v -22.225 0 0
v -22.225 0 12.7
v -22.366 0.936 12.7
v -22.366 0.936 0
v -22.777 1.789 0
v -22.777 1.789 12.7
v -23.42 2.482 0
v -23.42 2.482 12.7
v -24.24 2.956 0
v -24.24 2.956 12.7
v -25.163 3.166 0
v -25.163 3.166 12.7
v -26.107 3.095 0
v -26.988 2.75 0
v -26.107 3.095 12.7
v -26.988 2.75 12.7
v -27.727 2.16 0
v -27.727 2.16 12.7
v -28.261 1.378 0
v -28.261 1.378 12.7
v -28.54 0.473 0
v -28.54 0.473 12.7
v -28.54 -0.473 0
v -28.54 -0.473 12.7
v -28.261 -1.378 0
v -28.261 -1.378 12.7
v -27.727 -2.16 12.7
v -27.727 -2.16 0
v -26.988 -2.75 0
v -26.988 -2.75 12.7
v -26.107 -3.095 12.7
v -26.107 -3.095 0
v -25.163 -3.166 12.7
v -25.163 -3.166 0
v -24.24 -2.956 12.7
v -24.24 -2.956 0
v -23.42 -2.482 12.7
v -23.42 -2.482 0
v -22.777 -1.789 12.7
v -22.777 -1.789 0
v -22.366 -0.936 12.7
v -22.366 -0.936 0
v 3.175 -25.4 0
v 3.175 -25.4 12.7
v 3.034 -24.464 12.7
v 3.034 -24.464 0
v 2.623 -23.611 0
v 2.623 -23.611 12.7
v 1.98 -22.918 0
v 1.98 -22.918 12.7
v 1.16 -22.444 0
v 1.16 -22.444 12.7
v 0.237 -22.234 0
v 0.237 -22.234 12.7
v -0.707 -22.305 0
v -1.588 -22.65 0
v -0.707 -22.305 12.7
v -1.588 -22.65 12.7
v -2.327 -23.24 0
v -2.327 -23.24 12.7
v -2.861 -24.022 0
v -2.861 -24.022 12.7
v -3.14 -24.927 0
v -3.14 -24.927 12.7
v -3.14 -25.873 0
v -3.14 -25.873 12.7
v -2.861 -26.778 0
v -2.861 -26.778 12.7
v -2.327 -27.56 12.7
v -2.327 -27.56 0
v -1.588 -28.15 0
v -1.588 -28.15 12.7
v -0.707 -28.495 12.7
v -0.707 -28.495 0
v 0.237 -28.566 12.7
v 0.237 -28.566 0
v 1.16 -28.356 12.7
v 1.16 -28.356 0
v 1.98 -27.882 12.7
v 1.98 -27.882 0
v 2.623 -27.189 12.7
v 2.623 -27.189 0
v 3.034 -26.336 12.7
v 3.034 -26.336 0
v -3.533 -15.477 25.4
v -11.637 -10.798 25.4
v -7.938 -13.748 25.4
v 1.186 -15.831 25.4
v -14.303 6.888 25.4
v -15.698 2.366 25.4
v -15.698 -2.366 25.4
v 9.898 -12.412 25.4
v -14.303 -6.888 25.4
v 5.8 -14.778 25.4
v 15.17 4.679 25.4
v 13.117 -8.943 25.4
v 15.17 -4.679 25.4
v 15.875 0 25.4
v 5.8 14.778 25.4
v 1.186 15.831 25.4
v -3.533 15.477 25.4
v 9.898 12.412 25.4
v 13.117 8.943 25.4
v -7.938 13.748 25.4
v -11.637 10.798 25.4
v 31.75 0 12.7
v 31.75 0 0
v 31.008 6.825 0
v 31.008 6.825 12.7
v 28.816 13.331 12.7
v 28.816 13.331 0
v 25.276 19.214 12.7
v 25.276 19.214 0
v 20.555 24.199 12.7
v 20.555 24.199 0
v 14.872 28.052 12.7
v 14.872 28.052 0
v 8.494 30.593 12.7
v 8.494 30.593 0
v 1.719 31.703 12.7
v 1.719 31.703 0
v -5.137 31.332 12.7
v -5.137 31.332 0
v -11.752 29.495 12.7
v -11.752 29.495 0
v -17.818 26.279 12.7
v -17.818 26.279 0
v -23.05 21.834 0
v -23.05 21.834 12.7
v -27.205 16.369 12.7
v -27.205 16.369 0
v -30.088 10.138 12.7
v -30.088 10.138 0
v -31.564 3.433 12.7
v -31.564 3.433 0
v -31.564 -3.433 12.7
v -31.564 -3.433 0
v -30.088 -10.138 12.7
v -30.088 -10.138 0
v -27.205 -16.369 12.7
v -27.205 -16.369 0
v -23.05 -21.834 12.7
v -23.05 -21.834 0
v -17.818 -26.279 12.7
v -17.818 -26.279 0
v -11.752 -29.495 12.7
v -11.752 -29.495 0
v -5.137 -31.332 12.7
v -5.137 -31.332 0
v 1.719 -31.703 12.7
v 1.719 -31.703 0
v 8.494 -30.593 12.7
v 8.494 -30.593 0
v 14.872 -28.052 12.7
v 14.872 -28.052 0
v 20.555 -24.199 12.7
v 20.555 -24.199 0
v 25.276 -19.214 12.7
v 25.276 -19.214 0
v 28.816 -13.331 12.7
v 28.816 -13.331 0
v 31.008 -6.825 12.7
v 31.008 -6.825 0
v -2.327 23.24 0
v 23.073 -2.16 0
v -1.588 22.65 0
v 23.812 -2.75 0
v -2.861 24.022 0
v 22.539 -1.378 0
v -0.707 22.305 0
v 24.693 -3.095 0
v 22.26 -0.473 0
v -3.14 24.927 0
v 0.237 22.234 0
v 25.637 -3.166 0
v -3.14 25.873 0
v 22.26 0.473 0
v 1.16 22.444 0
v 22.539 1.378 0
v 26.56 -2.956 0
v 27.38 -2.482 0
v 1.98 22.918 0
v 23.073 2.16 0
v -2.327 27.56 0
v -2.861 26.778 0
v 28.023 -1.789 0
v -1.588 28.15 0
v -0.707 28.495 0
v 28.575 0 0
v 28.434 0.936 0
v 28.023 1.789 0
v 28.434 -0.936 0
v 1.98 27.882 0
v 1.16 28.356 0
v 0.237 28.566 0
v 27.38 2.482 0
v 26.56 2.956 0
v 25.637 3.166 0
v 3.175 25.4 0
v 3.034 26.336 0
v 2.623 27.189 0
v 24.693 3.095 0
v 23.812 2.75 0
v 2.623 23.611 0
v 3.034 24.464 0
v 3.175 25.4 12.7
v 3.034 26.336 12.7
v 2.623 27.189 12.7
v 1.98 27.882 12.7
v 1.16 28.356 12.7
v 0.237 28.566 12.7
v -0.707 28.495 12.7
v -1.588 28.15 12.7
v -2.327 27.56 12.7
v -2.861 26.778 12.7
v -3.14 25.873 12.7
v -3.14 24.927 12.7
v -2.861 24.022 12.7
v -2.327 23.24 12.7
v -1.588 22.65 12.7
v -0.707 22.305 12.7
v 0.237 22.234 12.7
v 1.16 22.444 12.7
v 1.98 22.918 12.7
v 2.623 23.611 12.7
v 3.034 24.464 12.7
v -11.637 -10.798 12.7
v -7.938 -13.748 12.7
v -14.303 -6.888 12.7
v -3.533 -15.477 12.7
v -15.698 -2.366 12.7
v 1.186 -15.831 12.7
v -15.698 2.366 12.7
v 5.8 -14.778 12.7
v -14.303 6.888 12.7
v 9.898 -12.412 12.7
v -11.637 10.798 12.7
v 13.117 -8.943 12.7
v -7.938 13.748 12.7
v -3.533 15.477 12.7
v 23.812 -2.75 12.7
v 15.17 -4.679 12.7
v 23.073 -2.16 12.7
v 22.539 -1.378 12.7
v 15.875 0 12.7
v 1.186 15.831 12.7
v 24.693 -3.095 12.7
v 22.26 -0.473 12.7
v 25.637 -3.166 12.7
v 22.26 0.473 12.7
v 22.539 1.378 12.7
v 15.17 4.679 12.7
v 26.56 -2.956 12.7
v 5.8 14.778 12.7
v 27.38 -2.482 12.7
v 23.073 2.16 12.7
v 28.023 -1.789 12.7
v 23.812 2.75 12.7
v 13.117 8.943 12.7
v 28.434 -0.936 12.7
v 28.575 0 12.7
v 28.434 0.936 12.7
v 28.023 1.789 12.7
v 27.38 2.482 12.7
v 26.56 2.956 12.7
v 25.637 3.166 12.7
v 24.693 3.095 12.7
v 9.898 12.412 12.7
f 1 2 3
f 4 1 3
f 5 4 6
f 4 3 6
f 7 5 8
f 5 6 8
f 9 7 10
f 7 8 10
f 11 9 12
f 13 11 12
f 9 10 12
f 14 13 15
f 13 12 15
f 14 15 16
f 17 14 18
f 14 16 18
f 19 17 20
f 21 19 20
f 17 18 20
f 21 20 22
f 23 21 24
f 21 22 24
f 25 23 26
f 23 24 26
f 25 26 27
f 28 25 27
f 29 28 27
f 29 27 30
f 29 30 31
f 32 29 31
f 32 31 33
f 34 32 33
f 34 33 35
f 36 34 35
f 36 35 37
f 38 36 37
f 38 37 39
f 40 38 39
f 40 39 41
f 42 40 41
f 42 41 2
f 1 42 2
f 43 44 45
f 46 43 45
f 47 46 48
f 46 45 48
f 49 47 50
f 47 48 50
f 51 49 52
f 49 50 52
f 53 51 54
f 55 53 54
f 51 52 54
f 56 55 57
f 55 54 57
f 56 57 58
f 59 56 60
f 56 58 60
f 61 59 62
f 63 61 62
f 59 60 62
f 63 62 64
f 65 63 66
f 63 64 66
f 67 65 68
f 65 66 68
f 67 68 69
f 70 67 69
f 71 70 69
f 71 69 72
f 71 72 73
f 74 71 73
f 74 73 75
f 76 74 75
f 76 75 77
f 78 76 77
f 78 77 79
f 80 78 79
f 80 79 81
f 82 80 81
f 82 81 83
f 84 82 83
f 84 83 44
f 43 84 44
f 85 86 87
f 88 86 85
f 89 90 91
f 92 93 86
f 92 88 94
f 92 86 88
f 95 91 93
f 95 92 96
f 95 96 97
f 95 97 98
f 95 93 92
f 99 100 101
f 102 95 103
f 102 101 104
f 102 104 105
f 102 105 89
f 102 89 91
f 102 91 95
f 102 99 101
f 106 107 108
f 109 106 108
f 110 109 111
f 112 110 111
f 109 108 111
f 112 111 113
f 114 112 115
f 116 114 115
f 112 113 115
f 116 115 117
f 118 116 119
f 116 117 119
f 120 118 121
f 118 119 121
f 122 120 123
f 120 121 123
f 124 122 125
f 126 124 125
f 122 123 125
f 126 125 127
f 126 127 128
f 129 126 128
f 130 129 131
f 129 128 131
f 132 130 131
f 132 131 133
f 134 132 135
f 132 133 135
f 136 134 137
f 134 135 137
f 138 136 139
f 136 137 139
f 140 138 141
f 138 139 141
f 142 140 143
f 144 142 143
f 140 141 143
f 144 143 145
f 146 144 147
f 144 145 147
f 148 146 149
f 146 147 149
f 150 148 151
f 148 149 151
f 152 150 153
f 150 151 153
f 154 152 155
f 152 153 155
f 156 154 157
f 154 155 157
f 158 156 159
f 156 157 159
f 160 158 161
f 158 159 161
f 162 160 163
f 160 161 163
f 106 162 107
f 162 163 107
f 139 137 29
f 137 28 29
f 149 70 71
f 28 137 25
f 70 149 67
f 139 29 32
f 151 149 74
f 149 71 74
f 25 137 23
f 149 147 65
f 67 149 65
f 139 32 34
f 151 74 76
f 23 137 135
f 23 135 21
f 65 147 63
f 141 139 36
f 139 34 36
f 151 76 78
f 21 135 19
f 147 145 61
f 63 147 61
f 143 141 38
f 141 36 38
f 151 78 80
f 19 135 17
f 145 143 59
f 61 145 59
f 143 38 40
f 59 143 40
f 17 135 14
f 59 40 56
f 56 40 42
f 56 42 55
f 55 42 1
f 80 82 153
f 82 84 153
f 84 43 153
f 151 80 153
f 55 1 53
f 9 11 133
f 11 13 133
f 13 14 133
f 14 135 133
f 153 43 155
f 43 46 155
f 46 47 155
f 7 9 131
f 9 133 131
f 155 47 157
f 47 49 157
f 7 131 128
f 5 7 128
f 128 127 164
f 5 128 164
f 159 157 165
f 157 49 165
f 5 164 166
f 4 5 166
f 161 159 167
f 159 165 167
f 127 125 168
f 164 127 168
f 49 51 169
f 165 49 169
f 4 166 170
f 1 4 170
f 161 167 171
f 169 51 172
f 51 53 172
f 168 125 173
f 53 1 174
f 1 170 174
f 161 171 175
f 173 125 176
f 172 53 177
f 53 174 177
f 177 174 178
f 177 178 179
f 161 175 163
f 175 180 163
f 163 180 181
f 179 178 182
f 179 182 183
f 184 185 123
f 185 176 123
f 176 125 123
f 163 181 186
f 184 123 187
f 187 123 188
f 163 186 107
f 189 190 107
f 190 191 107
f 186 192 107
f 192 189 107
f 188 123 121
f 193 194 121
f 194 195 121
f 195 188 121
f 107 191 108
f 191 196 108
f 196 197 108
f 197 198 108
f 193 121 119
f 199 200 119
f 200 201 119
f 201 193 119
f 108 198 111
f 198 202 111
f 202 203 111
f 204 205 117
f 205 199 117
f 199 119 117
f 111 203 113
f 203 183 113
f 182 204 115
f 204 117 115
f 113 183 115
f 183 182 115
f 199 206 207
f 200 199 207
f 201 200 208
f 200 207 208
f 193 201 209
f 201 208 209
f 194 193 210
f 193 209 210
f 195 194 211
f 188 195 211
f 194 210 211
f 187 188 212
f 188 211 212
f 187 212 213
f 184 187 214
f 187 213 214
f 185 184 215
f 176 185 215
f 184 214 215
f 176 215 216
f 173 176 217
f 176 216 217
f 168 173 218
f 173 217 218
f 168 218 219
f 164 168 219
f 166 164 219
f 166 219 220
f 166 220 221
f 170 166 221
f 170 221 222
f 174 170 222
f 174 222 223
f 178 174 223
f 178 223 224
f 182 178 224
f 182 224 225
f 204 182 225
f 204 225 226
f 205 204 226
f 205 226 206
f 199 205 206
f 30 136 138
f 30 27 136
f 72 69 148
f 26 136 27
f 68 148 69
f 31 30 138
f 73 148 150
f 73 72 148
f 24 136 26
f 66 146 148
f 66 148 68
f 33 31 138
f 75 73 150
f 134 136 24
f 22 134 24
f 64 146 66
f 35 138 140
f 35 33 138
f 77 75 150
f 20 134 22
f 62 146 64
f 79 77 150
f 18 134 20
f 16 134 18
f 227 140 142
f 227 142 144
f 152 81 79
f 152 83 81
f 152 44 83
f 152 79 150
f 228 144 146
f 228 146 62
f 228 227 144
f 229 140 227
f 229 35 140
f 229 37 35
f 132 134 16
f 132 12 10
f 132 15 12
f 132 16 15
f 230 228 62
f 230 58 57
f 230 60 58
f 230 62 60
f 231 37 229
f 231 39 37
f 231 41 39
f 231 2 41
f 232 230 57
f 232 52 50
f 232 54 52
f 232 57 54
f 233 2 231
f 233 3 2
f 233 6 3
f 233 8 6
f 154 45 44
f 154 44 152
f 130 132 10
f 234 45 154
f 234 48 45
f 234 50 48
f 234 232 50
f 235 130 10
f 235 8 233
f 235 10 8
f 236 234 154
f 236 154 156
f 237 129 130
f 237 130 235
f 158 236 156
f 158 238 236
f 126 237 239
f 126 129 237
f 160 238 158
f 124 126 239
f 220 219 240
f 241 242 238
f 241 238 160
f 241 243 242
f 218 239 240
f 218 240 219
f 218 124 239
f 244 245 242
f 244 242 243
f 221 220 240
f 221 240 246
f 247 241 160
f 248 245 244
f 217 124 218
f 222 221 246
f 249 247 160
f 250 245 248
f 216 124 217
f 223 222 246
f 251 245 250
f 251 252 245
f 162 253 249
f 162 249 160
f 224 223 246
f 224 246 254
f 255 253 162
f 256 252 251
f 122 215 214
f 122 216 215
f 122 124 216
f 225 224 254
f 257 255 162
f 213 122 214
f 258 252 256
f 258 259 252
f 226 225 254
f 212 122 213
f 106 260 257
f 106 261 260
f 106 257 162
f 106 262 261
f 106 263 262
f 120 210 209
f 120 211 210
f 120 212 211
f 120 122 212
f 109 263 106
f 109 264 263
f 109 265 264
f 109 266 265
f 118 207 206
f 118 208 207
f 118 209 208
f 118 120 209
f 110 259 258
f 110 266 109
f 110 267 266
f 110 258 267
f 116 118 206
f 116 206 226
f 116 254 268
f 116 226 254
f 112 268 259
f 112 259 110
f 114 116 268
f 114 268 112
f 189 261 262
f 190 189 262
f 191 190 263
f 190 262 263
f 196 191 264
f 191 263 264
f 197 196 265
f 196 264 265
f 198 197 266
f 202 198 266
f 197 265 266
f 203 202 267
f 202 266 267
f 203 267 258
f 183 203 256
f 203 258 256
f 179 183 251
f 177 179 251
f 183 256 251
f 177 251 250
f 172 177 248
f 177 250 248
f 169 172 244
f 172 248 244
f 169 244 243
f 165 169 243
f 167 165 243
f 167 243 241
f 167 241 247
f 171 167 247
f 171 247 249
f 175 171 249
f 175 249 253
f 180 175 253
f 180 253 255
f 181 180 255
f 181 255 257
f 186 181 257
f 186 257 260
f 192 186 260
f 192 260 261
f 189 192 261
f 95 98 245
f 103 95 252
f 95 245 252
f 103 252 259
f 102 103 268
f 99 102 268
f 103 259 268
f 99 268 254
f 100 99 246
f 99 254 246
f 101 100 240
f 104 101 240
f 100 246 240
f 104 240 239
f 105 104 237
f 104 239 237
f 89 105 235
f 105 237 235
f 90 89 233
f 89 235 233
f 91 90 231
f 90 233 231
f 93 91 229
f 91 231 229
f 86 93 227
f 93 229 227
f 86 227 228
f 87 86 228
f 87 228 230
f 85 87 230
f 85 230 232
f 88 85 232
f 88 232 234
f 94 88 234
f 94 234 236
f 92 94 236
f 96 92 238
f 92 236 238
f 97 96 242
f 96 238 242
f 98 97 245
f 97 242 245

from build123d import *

# Parameters (mm, degrees)
F0_R     = 31.75
F1_DEPTH = 12.7
F2_R     = 15.875
F3_DEPTH = 12.7
F4_R     = 3.175
F5_DEPTH = 12.701


with BuildPart() as f1:
    # F0 (on Top) → F1 (new body)
    with BuildSketch(Plane.XY):
        Circle(F0_R)
    extrude(amount=F1_DEPTH)

    # F2 (on face) → F3 (join)
    with BuildSketch(Plane.XY.offset(12.7)):
        Circle(F2_R)
    extrude(amount=F3_DEPTH)

    # F4 (on face) → F5 (cut, through all)
    with BuildSketch(Plane.XY.offset(12.7)):
        with Locations((25.4, 0)):
            Circle(F4_R)
        with Locations((0, 25.4)):
            Circle(F4_R)
        with Locations((-25.4, 0)):
            Circle(F4_R)
        with Locations((0, -25.4)):
            Circle(F4_R)
    extrude(amount=-F5_DEPTH, mode=Mode.SUBTRACT)


solid = f1.part
